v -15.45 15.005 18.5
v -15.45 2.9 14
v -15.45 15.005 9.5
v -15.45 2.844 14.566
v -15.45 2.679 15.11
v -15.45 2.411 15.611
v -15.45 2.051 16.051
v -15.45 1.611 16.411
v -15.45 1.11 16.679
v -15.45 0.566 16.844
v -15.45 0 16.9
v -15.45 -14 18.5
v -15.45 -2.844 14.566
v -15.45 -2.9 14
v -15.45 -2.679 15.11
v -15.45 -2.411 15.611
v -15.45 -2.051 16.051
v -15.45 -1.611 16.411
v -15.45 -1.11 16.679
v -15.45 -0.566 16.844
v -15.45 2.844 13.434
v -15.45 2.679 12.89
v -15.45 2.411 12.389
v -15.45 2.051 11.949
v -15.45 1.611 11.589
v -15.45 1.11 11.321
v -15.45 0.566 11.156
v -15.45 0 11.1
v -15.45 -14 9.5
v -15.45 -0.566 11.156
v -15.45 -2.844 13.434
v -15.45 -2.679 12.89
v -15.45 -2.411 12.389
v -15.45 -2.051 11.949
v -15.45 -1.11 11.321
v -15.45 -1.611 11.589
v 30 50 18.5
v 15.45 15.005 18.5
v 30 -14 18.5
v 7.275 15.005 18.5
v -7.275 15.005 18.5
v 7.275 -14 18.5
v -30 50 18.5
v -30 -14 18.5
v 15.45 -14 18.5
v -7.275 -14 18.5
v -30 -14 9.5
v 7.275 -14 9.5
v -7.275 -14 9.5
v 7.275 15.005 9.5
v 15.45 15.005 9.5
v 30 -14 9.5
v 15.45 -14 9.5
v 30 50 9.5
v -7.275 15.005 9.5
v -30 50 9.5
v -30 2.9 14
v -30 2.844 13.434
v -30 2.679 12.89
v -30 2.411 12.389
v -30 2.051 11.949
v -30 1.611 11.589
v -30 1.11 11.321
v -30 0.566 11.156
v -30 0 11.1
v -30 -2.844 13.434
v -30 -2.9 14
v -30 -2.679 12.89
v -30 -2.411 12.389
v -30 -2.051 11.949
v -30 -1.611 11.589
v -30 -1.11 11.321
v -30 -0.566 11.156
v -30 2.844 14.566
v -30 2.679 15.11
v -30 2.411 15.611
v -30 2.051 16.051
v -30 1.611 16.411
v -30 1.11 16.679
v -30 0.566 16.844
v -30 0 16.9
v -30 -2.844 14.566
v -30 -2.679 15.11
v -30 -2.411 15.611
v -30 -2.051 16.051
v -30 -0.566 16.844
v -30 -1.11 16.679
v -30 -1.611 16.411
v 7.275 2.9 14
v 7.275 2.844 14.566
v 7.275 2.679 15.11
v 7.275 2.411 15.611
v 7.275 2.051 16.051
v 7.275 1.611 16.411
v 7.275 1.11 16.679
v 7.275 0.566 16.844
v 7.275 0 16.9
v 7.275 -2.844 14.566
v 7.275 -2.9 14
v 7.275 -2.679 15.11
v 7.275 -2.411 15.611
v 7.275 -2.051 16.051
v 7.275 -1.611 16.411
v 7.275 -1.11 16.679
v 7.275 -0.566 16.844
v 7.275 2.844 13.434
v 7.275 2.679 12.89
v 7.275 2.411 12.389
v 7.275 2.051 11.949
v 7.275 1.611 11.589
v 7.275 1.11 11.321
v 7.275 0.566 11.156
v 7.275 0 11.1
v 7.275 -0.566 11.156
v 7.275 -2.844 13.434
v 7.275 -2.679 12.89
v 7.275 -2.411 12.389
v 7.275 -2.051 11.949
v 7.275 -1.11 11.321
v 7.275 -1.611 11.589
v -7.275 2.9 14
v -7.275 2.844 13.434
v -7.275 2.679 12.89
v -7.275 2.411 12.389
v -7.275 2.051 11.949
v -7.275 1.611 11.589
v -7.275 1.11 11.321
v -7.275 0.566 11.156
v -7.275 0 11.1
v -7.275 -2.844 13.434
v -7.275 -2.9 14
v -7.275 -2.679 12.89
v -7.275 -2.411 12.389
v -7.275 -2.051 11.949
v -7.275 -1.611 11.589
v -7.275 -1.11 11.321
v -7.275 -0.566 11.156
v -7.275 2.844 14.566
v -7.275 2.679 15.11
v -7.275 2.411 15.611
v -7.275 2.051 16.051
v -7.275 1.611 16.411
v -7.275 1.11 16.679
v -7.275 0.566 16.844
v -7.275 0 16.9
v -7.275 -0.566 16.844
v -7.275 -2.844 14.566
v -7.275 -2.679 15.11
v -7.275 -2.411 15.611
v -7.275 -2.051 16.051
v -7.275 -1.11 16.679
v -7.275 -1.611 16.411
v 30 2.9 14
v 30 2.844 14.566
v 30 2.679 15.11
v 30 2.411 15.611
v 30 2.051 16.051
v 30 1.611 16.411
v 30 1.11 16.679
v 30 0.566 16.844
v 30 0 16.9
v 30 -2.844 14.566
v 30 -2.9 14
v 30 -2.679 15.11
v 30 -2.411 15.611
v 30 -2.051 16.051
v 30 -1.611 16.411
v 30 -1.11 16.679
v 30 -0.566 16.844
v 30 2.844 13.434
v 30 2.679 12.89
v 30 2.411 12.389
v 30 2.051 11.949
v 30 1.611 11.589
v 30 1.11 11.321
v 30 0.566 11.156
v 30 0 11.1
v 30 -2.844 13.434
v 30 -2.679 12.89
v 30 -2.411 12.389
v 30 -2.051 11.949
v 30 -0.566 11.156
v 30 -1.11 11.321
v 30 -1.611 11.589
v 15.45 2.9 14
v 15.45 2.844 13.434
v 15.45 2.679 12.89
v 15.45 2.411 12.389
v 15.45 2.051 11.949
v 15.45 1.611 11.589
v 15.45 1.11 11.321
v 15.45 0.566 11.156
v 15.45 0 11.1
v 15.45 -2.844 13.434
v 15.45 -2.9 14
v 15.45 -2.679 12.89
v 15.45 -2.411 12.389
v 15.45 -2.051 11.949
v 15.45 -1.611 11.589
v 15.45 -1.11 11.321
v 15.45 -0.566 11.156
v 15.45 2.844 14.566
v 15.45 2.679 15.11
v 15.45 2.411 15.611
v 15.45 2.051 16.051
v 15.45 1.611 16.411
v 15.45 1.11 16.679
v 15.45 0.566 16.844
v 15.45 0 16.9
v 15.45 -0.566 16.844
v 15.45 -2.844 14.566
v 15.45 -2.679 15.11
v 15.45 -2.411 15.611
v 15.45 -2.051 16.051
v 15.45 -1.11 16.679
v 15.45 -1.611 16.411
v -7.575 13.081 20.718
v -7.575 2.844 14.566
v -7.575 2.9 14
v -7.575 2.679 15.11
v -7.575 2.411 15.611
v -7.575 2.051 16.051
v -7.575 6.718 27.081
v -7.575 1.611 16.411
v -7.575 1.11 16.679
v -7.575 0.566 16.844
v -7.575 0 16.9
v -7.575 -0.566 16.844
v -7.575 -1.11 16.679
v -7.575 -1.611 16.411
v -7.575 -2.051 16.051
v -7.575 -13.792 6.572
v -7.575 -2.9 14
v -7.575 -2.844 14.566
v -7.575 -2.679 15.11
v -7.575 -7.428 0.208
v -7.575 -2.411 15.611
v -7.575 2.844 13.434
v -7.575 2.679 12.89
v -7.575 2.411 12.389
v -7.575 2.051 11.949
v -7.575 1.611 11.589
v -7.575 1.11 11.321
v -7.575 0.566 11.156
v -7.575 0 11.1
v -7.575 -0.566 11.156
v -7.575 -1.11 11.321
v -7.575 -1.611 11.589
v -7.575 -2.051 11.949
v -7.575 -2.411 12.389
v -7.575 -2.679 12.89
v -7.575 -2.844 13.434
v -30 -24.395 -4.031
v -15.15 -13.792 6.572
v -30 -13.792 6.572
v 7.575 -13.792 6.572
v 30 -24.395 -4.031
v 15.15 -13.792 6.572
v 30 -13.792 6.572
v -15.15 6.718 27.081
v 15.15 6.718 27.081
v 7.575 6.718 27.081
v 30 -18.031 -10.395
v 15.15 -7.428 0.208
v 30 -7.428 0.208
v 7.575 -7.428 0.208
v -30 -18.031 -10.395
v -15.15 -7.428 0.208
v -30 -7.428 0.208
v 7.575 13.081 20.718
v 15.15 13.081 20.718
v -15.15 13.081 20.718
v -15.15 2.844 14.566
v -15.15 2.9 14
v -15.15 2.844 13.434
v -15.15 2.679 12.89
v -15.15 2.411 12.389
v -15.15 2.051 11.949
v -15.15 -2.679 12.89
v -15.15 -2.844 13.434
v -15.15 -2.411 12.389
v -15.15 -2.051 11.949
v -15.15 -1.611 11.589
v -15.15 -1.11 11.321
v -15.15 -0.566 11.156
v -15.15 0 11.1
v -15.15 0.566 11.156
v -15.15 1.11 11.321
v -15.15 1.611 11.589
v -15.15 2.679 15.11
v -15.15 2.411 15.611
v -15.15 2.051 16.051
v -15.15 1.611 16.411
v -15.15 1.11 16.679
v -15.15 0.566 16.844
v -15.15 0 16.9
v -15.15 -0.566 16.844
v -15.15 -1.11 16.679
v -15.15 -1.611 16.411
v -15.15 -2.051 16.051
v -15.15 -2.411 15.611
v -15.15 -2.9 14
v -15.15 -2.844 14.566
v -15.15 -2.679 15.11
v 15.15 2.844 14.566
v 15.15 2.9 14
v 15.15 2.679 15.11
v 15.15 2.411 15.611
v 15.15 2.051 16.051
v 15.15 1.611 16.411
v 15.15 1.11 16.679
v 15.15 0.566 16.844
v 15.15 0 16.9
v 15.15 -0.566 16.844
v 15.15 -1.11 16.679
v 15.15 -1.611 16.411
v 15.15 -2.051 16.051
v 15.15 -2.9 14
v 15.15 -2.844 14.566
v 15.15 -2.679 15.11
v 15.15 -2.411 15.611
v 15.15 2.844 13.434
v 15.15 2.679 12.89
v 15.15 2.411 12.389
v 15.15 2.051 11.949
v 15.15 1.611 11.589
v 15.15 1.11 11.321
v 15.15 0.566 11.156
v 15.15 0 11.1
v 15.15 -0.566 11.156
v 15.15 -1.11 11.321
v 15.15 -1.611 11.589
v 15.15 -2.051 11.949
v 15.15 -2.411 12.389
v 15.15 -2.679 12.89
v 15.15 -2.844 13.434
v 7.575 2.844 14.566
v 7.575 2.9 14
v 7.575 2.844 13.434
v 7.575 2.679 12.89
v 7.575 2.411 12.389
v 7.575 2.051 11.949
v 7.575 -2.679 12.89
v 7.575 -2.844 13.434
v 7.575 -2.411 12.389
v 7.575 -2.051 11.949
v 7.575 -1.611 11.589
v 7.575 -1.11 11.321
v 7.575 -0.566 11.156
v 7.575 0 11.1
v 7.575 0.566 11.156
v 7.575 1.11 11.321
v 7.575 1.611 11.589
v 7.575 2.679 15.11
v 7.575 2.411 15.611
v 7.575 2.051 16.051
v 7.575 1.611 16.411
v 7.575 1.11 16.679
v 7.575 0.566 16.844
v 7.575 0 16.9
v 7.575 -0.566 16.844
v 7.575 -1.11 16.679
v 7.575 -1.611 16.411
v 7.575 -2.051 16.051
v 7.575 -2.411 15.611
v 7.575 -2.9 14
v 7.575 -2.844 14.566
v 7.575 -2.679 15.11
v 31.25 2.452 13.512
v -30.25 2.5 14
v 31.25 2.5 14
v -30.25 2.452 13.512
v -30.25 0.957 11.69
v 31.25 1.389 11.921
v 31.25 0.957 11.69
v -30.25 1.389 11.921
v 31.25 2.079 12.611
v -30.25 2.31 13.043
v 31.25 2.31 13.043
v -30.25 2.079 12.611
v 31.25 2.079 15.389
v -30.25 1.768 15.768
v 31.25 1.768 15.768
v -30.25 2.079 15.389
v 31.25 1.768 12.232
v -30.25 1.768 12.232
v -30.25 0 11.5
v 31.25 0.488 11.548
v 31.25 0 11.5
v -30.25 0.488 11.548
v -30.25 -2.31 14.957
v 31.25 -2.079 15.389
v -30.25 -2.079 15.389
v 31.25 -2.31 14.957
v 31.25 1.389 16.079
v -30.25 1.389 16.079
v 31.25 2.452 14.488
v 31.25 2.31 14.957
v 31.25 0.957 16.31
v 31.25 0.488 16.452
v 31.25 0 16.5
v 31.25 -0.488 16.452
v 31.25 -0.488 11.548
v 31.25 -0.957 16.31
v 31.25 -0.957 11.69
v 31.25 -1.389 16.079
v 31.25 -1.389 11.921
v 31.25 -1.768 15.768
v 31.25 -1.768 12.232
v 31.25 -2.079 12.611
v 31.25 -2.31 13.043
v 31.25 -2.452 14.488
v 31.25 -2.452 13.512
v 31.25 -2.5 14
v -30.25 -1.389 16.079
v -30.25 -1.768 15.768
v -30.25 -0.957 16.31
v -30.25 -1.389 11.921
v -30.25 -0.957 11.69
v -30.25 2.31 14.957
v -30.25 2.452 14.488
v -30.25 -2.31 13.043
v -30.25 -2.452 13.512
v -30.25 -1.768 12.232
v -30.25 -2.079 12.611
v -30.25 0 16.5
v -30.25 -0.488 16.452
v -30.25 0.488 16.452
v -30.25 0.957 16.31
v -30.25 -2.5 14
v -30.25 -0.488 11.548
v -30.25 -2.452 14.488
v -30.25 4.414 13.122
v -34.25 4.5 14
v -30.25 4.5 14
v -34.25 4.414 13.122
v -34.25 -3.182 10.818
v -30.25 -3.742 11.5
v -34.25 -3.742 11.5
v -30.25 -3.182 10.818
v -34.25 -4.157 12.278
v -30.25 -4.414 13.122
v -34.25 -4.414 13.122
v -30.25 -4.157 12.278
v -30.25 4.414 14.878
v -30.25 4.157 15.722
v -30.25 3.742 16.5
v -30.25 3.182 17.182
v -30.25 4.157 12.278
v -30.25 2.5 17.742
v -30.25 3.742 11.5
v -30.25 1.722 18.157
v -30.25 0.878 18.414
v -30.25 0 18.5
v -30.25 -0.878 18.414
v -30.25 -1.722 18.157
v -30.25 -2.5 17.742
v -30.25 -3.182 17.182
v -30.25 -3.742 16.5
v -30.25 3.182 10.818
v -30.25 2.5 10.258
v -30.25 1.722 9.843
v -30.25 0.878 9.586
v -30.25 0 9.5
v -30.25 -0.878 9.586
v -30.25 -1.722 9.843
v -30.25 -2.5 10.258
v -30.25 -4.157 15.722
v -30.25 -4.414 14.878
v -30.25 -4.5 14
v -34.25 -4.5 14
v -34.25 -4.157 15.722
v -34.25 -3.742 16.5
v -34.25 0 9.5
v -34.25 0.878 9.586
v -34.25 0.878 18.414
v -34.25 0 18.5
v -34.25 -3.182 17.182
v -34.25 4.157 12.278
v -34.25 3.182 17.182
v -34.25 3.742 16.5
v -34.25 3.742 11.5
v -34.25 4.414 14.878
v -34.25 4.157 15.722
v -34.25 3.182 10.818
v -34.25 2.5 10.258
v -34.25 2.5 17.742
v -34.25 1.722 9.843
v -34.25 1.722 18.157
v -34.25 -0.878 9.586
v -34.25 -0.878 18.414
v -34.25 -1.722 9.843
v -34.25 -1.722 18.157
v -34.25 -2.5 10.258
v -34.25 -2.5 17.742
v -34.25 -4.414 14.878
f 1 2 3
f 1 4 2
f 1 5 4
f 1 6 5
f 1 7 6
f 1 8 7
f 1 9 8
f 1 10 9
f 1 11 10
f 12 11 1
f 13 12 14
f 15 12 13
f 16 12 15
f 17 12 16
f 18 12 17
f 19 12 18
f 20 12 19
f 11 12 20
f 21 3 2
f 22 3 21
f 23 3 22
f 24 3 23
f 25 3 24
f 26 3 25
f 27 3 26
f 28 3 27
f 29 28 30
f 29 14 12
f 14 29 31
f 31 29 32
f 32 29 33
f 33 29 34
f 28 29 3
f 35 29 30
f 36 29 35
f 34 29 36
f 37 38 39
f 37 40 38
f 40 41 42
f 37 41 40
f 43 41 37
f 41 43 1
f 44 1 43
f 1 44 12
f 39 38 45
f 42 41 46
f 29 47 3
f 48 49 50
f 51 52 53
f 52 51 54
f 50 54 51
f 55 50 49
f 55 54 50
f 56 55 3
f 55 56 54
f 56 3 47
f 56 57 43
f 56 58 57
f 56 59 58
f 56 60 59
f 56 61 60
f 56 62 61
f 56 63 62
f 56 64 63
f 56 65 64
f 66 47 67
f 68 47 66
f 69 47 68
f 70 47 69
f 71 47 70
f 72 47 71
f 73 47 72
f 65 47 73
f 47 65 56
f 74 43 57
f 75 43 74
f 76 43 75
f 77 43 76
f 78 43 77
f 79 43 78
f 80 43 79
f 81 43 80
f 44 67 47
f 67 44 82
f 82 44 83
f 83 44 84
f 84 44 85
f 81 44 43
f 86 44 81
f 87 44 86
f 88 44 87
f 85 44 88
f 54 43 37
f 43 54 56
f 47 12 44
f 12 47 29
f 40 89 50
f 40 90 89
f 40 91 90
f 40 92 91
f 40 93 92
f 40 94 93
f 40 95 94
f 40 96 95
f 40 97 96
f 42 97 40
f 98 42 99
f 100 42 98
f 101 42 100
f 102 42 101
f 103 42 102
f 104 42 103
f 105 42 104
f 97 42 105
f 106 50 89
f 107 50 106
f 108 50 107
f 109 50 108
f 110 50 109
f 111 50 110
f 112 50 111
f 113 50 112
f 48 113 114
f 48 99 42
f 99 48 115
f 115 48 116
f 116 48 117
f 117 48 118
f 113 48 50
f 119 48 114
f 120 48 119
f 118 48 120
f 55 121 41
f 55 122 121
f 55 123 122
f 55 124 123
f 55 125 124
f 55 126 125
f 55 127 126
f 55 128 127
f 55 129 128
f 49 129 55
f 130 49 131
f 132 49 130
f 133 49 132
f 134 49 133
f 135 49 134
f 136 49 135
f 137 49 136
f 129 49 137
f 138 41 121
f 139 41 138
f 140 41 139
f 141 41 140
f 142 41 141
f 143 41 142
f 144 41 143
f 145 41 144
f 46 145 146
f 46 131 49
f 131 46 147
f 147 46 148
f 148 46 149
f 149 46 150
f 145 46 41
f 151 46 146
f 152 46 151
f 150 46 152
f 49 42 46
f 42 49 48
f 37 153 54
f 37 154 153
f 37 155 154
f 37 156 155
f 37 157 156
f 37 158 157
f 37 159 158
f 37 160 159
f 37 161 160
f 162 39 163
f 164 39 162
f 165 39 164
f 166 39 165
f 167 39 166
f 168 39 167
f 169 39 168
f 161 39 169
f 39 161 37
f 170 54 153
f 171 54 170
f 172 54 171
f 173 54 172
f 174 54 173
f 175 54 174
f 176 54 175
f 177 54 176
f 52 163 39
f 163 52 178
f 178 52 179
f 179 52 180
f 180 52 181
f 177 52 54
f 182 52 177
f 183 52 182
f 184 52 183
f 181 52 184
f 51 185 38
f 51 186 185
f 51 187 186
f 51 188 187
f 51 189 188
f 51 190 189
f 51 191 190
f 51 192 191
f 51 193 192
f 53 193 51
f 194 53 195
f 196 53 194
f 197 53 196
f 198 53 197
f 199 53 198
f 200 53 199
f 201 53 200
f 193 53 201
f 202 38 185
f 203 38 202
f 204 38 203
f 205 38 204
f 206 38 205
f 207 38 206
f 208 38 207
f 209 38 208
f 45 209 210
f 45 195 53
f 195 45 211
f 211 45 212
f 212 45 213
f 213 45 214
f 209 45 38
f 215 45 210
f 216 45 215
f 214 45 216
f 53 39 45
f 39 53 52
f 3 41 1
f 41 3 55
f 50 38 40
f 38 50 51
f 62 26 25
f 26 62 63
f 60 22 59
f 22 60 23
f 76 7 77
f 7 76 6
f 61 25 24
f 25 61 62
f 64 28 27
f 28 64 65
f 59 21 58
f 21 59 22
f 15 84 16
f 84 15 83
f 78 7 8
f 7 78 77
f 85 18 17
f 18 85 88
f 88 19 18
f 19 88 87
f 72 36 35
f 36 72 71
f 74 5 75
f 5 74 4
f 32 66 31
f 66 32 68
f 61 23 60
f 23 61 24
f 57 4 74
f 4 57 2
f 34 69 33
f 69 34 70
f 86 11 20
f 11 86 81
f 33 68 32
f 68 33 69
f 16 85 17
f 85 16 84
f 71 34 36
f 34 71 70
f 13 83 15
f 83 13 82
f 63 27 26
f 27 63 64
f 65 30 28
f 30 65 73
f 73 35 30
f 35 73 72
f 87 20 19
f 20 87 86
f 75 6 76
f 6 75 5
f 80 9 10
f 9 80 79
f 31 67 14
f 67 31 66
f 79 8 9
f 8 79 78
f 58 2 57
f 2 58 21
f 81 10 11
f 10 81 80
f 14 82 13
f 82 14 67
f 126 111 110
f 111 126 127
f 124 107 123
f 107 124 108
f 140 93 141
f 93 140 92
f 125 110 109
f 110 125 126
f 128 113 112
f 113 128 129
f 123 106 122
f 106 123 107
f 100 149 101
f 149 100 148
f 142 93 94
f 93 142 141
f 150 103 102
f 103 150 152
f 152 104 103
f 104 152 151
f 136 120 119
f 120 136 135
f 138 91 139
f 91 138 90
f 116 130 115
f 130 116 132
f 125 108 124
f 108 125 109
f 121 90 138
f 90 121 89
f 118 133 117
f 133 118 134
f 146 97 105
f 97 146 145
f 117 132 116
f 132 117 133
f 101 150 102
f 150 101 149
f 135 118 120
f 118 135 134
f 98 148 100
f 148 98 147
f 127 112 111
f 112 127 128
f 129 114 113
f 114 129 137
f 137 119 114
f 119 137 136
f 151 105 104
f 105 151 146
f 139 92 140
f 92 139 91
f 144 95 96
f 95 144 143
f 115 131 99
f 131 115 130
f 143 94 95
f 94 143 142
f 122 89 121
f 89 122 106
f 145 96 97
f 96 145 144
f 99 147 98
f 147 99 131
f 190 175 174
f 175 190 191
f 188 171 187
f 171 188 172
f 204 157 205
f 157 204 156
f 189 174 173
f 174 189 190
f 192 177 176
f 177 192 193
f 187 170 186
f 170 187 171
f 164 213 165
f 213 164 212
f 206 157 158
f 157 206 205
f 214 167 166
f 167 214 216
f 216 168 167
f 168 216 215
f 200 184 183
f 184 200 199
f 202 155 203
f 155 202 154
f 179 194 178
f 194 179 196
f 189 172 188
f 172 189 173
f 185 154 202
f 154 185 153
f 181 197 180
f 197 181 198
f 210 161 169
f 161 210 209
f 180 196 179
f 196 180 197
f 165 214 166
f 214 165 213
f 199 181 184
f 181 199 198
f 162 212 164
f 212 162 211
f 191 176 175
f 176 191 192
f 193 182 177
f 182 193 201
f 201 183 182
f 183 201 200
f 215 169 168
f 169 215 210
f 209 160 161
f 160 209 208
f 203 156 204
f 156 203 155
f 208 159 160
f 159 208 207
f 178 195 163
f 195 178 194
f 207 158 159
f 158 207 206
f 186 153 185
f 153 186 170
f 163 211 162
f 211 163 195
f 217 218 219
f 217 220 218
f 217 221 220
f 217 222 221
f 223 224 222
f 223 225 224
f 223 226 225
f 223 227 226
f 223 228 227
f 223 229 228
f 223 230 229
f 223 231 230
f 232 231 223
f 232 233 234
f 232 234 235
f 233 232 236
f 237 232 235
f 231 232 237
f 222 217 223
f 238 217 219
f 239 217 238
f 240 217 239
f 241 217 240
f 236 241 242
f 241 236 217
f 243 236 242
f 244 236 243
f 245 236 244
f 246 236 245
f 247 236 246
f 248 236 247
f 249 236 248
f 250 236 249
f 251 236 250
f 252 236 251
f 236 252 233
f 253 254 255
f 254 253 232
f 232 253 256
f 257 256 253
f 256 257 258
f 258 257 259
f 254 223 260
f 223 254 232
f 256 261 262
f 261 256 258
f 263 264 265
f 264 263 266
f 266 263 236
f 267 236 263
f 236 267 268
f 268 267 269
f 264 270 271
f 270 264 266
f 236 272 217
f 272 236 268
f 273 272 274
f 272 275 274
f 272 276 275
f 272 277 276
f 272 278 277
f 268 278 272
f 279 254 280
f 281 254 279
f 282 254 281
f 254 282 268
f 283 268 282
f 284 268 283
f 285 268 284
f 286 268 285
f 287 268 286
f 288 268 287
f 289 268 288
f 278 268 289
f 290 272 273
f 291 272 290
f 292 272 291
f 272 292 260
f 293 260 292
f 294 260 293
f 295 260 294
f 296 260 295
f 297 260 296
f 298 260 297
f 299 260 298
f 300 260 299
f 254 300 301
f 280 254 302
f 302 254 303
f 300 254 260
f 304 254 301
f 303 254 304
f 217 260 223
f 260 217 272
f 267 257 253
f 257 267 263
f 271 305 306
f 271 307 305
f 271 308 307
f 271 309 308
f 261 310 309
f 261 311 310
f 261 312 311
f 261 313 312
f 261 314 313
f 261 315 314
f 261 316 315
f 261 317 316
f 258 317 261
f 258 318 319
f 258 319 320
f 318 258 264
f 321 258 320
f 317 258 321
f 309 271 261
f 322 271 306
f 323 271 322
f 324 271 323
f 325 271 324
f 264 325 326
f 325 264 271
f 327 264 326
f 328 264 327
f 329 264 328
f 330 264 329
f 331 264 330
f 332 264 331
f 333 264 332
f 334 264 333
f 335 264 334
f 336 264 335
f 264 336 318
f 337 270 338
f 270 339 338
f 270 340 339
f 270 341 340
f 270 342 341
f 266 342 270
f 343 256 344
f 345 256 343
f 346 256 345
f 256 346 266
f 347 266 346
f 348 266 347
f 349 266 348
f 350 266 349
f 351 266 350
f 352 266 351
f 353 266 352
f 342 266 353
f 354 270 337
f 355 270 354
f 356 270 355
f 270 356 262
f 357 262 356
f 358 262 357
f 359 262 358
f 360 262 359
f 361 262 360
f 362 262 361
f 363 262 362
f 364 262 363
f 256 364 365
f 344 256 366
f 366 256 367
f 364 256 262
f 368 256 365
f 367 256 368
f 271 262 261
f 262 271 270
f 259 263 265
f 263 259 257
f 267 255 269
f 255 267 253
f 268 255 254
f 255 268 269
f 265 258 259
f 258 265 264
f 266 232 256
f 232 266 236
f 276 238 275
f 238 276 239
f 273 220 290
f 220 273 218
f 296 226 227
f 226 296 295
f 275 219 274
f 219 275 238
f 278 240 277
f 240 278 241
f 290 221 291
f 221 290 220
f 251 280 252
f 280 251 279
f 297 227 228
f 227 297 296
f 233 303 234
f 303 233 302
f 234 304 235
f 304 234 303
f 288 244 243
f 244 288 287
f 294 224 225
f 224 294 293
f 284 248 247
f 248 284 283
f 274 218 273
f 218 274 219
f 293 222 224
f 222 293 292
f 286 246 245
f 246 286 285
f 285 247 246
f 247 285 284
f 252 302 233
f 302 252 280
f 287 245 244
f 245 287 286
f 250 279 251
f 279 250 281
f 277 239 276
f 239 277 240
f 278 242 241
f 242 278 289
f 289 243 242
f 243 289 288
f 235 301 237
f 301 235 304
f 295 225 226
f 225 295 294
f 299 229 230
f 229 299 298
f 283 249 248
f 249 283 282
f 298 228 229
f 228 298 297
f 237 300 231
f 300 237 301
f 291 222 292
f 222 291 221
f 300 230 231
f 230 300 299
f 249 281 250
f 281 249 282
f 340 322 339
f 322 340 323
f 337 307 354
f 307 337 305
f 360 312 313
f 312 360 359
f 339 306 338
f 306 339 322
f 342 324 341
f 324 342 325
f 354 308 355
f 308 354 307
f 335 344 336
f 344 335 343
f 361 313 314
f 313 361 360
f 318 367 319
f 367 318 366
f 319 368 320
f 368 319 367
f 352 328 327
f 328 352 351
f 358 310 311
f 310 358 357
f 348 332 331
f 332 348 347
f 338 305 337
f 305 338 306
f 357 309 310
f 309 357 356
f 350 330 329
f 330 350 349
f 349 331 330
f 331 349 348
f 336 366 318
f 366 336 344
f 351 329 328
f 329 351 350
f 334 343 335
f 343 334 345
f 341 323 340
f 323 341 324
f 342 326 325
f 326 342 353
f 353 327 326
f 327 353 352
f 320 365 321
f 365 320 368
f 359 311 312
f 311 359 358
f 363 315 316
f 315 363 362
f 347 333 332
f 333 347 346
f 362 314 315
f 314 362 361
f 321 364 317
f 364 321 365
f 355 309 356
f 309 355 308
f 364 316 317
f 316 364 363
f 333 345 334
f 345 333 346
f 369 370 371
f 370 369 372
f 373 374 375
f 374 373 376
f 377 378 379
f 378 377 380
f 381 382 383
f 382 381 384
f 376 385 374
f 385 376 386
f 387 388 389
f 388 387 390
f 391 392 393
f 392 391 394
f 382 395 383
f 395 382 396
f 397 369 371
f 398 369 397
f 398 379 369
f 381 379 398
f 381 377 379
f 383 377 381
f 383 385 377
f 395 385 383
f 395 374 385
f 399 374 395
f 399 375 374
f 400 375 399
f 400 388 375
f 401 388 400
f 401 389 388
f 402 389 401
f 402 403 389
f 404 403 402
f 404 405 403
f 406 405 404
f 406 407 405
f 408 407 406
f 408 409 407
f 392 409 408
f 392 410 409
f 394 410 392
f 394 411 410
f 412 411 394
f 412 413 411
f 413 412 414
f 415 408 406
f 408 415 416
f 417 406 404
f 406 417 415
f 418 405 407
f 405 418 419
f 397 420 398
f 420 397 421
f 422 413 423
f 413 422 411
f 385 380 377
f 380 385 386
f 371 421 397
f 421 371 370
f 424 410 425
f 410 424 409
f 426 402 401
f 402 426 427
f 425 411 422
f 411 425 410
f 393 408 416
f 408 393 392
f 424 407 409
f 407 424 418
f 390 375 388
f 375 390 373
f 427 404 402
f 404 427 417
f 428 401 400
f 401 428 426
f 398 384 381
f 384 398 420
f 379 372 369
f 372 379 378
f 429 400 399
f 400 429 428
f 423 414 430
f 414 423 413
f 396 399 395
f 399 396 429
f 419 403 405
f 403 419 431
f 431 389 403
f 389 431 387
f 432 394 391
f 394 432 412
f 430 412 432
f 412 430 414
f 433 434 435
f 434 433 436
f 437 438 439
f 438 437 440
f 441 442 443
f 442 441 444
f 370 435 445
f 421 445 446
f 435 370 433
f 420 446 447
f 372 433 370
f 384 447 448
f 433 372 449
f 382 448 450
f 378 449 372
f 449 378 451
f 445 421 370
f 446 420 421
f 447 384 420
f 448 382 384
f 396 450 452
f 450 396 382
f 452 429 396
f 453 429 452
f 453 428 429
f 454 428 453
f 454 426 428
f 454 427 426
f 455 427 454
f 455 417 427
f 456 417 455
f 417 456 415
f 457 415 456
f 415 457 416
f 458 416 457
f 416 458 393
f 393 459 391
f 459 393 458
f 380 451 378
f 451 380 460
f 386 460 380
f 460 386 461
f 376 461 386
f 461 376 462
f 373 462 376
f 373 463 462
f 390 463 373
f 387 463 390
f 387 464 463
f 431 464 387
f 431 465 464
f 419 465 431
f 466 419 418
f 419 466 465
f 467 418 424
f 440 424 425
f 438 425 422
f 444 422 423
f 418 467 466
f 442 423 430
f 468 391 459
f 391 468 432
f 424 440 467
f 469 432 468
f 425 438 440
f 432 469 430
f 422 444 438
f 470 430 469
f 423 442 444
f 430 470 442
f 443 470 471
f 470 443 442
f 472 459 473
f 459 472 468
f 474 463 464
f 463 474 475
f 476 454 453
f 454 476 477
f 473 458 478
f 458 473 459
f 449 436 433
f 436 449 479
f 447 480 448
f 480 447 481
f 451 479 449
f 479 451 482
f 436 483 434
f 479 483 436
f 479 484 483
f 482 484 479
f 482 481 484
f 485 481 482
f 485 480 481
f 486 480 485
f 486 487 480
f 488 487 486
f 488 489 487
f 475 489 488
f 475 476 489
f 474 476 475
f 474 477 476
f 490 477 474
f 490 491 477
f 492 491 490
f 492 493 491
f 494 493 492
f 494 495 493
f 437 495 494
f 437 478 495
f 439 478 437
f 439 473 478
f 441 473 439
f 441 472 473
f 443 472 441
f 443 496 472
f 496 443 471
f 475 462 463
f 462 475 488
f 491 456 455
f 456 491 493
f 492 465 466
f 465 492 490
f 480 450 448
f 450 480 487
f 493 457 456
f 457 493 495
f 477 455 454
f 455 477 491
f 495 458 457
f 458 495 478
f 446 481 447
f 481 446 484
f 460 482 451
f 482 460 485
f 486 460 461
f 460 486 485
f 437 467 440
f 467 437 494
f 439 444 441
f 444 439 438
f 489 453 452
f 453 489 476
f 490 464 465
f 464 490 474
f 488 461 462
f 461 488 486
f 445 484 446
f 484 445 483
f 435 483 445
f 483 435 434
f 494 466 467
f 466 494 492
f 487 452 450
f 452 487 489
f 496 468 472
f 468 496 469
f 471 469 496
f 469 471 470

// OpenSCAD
$fn = 32;

// ------------------------------------------------------------------------
// Butt hinge: hinge 60 mm, leaf swung 45 deg
// Every part is its own module, assembly() places every instance.
// ------------------------------------------------------------------------

// --- part 1 ---
module hinge_base() {
  difference() {
    union() {
      translate([-30, -14, -4.5]) cube([14.55, 64, 9]);
      translate([-7.275, -14, -4.5]) cube([14.55, 64, 9]);
      translate([15.45, -14, -4.5]) cube([14.55, 64, 9]);
      translate([-30, 15.005, -4.5]) cube([60, 34.995, 9]);
    }
    translate([-22.725, 0, 0]) rotate([0, 90, 0]) cylinder(h = 16.55, d = 5.8, center = true);
    translate([0, 0, 0]) rotate([0, 90, 0]) cylinder(h = 16.55, d = 5.8, center = true);
    translate([22.725, 0, 0]) rotate([0, 90, 0]) cylinder(h = 16.55, d = 5.8, center = true);
  }
}

// --- part 2 ---
module hinge_mover() {
  difference() {
    union() {
      translate([-15.15, -30, -4.5]) cube([7.575, 44, 9]);
      translate([7.575, -30, -4.5]) cube([7.575, 44, 9]);
      translate([-30, -30, -4.5]) cube([60, 14.995, 9]);
    }
    translate([-11.362, 0, 0]) rotate([0, 90, 0]) cylinder(h = 9.575, d = 5.8, center = true);
    translate([11.362, 0, 0]) rotate([0, 90, 0]) cylinder(h = 9.575, d = 5.8, center = true);
  }
}

// --- part 3 ---
module hinge_pin() {
  rotate([0, 90, 0]) cylinder(h = 62.5, d = 5, center = true);
  translate([-34.25, 0, 0]) rotate([0, 90, 0]) cylinder(h = 4, d = 9);
}

// --- assembly ---
module assembly() {
  color([0.80, 0.24, 0.20]) translate([0, 0, 14]) rotate([0, 0, 0]) hinge_base();
  color([0.20, 0.45, 0.75]) translate([0, 0, 14]) rotate([45, 0, 0]) hinge_mover();
  color([0.25, 0.62, 0.32]) translate([0, 0, 14]) rotate([0, 0, 0]) hinge_pin();
}

assembly();
